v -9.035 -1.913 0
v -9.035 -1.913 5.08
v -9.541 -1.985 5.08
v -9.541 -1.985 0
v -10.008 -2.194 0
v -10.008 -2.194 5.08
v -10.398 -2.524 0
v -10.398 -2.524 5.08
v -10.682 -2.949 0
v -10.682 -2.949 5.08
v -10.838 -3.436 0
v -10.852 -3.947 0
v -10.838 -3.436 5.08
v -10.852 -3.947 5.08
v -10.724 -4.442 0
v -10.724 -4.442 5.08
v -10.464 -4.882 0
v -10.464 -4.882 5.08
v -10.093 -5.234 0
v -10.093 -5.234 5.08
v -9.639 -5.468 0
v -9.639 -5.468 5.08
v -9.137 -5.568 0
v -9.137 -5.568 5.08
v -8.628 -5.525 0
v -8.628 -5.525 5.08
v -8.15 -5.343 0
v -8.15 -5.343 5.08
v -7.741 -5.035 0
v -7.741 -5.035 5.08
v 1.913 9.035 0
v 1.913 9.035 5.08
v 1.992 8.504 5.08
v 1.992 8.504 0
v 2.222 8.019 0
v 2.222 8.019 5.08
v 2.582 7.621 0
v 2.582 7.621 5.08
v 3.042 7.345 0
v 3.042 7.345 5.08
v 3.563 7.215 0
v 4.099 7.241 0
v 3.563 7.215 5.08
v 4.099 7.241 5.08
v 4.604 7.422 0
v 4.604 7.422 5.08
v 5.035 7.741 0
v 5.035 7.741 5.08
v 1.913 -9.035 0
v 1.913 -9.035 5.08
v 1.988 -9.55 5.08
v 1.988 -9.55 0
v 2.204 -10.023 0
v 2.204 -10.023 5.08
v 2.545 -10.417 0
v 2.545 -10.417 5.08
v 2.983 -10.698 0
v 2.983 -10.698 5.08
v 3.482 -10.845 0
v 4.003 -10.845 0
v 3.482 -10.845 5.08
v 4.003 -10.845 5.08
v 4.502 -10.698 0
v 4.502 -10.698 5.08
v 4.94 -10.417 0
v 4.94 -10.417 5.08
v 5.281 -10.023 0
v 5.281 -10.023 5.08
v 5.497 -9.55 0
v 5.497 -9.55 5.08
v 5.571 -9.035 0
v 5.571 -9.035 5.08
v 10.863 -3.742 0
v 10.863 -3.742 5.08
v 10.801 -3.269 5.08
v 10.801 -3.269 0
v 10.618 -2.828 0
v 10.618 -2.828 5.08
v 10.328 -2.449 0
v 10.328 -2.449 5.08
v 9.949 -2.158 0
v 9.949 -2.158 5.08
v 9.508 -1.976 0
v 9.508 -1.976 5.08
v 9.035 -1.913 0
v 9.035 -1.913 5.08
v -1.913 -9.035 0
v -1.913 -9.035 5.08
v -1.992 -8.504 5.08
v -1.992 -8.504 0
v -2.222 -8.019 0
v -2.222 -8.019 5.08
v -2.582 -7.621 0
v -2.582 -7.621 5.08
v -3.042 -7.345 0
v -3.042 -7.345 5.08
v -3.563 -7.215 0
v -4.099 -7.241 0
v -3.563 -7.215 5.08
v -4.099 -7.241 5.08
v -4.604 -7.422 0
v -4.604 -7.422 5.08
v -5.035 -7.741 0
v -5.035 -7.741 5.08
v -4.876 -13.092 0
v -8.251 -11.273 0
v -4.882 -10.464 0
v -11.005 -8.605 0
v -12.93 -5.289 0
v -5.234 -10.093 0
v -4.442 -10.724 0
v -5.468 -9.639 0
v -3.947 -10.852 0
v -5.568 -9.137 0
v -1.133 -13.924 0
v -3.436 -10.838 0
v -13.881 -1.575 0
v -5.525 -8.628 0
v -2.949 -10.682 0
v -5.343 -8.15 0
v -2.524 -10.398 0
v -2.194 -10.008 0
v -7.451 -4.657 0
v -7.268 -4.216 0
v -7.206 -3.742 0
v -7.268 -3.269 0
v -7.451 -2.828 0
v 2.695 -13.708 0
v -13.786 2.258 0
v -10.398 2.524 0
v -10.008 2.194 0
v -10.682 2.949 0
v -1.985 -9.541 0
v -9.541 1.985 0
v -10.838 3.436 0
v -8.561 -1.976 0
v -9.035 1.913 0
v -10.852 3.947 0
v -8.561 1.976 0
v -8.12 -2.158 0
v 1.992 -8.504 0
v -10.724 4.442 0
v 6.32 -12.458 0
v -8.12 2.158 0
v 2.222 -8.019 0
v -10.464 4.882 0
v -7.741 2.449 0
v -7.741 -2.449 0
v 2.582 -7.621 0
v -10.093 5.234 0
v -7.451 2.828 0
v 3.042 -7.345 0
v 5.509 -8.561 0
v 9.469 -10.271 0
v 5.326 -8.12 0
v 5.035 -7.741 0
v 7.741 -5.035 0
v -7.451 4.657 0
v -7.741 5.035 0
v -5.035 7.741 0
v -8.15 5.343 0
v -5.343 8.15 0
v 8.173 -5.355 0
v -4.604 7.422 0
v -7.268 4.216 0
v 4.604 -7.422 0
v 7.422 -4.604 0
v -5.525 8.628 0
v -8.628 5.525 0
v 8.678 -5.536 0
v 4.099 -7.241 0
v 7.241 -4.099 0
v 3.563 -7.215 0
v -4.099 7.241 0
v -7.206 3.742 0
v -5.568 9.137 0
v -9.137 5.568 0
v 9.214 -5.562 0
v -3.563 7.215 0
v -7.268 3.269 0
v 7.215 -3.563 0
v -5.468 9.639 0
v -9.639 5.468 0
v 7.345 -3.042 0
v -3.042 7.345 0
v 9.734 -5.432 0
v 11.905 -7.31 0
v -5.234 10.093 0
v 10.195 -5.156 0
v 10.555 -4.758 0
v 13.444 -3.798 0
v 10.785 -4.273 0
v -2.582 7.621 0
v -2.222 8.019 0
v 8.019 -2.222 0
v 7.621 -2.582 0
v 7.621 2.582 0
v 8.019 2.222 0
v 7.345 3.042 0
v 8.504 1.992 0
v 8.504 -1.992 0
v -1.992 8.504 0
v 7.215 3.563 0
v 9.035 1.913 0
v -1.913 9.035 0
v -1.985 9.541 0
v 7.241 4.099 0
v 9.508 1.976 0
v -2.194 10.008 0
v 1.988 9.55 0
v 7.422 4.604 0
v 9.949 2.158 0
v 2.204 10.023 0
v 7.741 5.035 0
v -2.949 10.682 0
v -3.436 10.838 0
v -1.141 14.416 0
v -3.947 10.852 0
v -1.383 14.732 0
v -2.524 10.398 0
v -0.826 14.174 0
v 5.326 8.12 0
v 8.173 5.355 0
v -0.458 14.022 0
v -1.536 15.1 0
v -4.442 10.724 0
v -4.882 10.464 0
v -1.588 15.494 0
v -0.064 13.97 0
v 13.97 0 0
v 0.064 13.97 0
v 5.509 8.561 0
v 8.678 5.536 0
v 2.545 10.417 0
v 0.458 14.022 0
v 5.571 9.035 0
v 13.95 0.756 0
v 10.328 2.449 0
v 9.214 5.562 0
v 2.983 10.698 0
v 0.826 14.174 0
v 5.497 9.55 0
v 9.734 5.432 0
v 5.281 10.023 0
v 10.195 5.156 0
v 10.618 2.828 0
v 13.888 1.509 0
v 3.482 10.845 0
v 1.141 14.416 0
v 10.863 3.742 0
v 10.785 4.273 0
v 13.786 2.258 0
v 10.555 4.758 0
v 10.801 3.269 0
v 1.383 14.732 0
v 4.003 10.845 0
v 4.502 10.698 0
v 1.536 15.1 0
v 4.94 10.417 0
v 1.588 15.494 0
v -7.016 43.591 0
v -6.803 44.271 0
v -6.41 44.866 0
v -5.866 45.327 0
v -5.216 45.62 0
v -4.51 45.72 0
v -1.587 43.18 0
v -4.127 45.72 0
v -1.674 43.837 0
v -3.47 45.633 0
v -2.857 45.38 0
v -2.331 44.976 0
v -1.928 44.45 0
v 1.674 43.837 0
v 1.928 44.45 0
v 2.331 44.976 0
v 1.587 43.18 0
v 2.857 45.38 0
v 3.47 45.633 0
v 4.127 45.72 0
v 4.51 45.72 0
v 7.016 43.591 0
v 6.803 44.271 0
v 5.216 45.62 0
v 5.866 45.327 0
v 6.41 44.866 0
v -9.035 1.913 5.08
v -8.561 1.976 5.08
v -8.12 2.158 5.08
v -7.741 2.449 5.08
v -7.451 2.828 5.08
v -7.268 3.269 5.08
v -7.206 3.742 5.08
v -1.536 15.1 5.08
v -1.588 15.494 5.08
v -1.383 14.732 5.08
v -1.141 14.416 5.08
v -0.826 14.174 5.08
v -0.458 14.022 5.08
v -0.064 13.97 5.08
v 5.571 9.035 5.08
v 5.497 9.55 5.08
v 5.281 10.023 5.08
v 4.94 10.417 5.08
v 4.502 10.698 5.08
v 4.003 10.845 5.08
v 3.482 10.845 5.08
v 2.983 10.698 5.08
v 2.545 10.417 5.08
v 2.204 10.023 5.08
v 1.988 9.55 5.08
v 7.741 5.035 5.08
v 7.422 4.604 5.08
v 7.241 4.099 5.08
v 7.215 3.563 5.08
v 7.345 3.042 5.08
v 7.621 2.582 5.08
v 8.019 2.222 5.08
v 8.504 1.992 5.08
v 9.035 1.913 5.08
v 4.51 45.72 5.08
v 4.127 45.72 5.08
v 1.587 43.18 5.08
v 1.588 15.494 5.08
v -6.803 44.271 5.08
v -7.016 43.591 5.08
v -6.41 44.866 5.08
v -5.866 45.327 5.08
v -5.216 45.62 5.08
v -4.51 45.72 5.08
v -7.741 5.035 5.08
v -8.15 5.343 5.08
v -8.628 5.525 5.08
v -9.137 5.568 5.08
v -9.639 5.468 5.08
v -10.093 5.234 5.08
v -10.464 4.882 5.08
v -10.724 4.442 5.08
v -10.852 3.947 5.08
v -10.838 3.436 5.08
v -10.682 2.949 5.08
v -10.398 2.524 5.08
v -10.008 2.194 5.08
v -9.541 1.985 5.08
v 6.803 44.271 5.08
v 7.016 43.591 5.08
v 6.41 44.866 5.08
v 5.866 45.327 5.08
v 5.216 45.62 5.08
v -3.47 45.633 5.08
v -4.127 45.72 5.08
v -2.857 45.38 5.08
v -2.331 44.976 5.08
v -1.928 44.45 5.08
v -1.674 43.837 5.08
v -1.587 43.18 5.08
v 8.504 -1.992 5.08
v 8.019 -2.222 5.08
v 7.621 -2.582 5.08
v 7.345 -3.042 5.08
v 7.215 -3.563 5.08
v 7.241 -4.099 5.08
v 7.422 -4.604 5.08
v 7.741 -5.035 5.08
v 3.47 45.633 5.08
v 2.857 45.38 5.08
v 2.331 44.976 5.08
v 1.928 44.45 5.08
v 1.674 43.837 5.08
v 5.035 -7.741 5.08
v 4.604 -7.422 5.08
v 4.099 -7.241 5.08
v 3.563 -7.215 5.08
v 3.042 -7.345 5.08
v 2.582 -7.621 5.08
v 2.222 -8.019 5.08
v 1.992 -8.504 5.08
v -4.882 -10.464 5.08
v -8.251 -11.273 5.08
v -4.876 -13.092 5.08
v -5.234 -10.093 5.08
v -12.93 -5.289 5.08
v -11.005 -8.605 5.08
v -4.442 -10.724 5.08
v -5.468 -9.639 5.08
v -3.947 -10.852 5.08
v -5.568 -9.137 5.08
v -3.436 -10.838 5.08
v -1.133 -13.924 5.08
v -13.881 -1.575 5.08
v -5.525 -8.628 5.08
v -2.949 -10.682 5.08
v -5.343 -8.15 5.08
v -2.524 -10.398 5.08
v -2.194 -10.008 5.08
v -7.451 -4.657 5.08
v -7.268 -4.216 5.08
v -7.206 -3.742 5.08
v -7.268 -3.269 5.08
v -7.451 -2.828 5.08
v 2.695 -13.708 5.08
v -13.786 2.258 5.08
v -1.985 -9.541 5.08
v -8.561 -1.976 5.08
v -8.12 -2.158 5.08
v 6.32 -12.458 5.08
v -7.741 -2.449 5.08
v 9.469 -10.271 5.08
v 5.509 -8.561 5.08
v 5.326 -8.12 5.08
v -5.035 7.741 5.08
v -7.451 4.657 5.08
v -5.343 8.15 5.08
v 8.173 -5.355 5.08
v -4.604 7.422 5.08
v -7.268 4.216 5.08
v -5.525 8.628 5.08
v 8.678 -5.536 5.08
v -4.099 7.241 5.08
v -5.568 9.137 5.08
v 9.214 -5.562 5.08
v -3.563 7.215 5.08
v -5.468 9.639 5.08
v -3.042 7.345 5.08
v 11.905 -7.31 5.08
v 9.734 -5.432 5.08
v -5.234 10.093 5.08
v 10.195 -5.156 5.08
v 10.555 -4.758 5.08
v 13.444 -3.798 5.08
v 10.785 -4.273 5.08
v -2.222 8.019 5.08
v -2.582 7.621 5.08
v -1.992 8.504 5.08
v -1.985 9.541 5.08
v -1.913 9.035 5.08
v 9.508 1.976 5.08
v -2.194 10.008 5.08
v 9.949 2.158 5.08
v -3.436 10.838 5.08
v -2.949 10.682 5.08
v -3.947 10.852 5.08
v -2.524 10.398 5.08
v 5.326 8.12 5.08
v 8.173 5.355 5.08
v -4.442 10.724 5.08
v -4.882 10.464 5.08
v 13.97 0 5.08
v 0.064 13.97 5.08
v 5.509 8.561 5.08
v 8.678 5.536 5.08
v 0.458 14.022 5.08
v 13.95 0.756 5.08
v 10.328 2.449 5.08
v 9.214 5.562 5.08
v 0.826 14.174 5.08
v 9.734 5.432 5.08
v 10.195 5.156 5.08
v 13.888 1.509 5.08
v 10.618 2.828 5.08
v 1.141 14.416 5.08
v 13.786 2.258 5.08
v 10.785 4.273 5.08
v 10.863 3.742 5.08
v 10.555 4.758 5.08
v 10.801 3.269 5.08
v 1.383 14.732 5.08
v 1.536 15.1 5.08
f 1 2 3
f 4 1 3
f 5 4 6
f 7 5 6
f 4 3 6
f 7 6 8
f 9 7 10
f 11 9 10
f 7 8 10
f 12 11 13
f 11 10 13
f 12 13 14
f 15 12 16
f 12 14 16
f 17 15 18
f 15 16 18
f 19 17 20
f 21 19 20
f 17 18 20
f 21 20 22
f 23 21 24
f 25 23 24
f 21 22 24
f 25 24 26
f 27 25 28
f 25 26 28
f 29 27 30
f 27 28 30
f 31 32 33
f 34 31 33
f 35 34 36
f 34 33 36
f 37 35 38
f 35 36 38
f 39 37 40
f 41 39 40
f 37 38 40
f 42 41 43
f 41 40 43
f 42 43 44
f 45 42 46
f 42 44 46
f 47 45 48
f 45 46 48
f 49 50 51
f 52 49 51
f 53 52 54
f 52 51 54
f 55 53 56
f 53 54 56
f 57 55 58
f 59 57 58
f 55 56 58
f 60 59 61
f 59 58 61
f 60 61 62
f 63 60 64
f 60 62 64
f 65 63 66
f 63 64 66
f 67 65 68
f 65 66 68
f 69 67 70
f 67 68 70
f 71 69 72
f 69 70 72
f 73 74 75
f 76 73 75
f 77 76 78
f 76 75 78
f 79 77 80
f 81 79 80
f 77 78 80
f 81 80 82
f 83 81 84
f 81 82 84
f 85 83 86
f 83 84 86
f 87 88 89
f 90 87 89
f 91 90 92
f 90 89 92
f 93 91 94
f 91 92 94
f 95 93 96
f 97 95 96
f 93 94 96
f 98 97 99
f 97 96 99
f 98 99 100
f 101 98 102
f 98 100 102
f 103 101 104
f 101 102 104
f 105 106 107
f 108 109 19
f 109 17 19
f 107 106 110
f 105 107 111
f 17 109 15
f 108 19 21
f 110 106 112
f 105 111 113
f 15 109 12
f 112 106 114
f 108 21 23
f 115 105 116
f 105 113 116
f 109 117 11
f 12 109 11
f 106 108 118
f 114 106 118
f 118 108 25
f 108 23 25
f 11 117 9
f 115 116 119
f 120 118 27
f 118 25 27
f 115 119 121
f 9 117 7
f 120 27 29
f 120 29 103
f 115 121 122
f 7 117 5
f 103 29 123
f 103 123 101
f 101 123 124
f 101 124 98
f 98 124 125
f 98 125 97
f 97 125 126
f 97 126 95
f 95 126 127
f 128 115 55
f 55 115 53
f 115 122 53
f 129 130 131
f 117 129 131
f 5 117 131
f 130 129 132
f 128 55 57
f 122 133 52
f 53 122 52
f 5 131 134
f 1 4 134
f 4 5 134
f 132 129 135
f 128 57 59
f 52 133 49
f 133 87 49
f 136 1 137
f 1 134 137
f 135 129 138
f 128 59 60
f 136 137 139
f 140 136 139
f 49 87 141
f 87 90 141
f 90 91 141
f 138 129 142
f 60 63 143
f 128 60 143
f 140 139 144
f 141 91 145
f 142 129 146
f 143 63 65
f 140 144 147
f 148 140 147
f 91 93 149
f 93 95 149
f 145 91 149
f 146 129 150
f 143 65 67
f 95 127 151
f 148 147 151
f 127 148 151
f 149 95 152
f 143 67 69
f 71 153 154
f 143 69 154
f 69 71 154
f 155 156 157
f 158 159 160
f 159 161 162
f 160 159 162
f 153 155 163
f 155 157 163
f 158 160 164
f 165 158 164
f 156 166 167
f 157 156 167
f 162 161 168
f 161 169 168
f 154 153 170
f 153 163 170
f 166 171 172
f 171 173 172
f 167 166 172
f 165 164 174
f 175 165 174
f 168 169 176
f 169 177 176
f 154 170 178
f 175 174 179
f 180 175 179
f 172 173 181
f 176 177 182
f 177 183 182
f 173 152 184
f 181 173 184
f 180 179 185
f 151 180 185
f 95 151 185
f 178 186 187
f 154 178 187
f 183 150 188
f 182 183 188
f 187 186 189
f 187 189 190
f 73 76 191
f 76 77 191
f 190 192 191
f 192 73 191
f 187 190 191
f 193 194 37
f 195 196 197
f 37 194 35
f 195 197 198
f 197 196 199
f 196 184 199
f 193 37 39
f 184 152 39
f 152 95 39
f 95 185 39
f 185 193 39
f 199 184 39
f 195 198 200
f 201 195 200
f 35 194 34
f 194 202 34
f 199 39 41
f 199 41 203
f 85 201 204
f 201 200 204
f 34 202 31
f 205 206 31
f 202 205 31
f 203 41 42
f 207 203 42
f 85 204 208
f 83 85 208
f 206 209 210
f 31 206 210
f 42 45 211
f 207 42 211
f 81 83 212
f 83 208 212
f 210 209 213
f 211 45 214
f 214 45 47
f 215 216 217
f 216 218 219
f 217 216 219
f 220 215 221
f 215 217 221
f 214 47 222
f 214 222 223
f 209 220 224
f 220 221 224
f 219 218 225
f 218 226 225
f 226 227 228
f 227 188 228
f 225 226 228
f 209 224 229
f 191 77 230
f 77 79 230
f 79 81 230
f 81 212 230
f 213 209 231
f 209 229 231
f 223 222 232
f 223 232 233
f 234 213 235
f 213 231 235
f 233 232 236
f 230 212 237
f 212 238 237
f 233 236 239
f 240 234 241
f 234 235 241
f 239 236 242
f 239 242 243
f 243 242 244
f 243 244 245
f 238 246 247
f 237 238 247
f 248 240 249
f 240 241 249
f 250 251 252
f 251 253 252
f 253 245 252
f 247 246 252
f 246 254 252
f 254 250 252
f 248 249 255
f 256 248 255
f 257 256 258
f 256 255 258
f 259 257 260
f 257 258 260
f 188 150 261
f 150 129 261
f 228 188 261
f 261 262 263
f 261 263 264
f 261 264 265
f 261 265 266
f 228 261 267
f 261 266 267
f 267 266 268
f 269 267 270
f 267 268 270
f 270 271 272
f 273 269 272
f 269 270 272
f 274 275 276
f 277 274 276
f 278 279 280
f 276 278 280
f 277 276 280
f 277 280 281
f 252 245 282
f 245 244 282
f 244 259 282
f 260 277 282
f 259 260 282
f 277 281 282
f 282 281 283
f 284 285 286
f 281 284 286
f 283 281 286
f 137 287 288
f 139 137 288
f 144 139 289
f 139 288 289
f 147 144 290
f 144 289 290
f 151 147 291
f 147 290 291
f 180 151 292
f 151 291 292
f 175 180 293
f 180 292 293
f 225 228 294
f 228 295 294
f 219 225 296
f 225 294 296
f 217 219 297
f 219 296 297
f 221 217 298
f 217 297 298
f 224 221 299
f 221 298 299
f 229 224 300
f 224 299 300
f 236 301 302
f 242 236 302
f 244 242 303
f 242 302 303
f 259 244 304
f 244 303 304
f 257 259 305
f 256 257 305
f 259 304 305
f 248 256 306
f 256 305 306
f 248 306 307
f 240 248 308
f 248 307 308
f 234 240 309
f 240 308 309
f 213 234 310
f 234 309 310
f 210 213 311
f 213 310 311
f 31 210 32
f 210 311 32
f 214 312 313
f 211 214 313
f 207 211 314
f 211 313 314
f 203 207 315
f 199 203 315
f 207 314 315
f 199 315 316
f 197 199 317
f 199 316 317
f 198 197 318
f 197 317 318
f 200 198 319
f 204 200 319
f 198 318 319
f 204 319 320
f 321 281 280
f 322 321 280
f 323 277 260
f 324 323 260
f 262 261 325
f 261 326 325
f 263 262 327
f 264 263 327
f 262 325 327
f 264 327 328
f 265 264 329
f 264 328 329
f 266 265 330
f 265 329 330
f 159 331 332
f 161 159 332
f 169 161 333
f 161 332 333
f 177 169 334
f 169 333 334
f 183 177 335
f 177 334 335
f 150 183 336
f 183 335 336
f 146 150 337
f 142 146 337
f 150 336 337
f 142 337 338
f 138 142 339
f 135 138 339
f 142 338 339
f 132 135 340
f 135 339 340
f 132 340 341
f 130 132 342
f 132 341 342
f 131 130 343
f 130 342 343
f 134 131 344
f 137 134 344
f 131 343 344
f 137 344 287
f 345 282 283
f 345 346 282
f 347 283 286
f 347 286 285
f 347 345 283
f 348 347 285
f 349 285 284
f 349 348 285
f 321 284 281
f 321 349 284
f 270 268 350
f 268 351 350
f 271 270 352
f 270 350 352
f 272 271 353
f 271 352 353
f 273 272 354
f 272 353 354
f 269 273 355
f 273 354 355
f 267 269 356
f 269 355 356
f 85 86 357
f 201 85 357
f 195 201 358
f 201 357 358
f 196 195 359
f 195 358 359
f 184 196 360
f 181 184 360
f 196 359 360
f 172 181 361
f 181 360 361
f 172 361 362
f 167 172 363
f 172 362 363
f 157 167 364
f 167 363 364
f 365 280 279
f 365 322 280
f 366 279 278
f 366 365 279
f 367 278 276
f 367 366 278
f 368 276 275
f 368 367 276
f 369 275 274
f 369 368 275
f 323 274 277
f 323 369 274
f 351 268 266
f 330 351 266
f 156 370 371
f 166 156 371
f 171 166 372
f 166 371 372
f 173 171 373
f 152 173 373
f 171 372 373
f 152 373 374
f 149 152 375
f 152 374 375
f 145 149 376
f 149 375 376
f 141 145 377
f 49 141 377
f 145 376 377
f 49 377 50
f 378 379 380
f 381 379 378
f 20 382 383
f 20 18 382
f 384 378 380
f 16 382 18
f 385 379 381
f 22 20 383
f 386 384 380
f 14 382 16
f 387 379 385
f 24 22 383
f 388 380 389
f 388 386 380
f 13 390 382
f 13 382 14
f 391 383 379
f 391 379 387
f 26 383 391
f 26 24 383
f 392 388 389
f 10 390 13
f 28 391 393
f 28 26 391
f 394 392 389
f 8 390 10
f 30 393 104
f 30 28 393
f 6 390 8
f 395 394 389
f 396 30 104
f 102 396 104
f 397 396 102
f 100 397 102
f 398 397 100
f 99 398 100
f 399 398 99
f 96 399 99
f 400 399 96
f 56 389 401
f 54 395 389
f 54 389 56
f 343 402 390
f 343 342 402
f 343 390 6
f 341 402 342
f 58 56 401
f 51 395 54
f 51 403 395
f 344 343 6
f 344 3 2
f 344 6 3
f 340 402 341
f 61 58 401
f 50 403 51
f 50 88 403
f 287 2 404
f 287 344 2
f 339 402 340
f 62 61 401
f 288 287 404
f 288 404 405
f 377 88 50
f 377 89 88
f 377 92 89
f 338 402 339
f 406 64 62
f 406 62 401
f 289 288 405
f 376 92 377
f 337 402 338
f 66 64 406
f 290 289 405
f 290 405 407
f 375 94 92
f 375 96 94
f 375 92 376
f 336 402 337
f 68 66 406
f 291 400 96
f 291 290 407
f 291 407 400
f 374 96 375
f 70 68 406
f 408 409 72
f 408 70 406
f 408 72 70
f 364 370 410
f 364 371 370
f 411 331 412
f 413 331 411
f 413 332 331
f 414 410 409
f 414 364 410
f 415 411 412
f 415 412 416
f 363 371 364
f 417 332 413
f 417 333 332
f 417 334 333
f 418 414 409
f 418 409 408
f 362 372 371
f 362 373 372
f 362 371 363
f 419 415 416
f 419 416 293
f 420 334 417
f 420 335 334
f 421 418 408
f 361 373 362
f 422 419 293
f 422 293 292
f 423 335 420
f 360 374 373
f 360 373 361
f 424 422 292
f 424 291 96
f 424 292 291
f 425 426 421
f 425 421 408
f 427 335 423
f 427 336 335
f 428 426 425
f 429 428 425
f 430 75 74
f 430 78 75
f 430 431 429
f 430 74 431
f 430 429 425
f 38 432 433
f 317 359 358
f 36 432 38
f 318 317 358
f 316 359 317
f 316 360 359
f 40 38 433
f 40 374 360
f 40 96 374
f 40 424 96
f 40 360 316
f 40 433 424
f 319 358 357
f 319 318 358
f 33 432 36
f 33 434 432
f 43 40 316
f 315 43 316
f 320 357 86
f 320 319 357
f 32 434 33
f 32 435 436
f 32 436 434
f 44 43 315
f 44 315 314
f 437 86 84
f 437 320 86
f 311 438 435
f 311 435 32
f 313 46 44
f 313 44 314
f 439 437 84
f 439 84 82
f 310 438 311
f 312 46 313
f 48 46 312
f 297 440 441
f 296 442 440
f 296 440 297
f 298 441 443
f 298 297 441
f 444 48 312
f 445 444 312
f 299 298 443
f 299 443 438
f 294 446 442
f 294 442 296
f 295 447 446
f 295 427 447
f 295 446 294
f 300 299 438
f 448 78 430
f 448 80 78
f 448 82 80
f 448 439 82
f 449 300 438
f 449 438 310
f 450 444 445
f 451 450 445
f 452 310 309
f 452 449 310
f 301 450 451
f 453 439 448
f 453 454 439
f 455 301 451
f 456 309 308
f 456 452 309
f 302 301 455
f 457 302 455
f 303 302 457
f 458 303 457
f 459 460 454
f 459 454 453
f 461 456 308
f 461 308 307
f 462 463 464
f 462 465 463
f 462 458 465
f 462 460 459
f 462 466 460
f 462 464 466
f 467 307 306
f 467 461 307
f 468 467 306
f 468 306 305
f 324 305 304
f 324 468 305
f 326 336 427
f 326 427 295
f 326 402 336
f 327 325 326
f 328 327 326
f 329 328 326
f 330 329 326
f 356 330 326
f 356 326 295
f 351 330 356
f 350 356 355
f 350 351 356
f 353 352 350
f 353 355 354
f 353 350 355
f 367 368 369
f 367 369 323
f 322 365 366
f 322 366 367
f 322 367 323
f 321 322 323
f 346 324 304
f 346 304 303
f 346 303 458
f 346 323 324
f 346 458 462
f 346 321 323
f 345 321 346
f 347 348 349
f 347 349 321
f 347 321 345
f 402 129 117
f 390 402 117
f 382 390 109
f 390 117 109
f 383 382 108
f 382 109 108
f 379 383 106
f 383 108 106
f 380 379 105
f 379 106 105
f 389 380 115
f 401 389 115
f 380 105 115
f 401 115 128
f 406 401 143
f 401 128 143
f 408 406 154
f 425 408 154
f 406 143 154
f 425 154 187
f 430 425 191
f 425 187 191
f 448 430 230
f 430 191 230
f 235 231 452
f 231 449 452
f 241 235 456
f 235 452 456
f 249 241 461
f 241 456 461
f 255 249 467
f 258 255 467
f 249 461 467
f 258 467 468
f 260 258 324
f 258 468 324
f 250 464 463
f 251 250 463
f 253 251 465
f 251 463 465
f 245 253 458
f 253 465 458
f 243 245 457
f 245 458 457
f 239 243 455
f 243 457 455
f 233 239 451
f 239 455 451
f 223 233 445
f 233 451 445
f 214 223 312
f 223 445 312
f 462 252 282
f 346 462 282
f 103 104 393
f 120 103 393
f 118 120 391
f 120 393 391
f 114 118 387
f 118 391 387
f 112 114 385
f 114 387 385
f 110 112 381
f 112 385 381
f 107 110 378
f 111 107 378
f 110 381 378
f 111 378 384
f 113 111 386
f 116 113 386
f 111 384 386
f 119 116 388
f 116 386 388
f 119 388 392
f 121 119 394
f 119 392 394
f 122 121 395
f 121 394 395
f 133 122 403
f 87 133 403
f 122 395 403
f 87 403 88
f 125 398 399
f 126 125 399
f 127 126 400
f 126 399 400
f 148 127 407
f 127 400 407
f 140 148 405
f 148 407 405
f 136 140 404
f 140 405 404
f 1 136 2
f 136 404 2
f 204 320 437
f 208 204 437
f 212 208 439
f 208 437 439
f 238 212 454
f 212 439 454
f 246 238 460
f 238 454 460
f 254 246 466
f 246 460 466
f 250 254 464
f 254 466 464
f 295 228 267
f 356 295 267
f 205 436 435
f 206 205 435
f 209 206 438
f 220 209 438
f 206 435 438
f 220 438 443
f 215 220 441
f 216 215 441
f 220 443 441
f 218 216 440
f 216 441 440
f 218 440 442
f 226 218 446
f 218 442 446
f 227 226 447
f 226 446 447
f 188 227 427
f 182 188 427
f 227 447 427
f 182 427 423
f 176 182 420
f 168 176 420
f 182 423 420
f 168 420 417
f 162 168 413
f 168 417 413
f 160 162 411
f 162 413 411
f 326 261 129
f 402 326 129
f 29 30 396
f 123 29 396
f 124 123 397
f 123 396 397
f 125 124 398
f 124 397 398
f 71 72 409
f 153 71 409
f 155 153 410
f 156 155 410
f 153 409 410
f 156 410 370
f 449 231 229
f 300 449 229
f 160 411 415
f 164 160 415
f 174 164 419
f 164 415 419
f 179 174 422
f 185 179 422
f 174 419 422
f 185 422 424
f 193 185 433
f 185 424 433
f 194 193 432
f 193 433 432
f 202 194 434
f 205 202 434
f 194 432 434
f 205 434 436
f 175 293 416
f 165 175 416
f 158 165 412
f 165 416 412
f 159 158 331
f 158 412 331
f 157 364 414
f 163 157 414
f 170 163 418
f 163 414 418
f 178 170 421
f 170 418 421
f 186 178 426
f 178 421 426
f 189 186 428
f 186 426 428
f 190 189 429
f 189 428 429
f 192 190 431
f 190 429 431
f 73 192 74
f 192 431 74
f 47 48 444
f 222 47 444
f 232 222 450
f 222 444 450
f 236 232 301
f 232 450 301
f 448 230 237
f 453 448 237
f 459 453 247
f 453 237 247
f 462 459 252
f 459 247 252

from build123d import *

# Parameters (mm, degrees)
F1_DEPTH = 5.08
F3_DEPTH = 25.4
F4_R     = 2.54
F5_R     = 1.524


with BuildPart() as f1:
    # F0 (on Top) → F1 (new body)
    with BuildSketch(Plane.XY):
        with BuildLine():
            ThreePointArc((-13.7862916745, 2.2581102419), (-1.1327853518, -13.9239971756), (13.97, 0))
            ThreePointArc((13.97, 0), (13.9239971756, 1.1327853518), (13.7862916745, 2.2581102419))
            ThreePointArc((13.7862916745, 2.2581102419), (9.0447526202, 10.646753028), (0, 13.97))
            ThreePointArc((0, 13.97), (-9.0447526202, 10.646753028), (-13.7862916745, 2.2581102419))
        make_face()
        with BuildLine():
            Line((-6.6675, 45.72), (-13.7862916745, 2.2581102419))
            ThreePointArc((-13.7862916745, 2.2581102419), (-9.0447526202, 10.646753028), (0, 13.97))
            Line((0, 13.97), (-1.5875, 13.97))
            Line((-1.5875, 13.97), (-1.5875, 45.72))
            Line((-1.5875, 45.72), (-6.6675, 45.72))
        make_face()
        with BuildLine():
            ThreePointArc((0, 13.97), (9.0447526202, 10.646753028), (13.7862916745, 2.2581102419))
            Line((13.7862916745, 2.2581102419), (6.6675, 45.72))
            Line((6.6675, 45.72), (1.5875, 45.72))
            Line((1.5875, 45.72), (1.5875, 13.97))
            Line((1.5875, 13.97), (0, 13.97))
        make_face()
    extrude(amount=F1_DEPTH)

    # F2 (on face) → F3 (cut)
    with BuildSketch(Plane.XY.offset(5.08)):
        with BuildLine():
            Line((-3.7422612851, 9.0346179484), (-1.9134612851, 9.0346179484))
            ThreePointArc((-1.9134612851, 9.0346179484), (-4.4421127462, 10.7242088375), (-5.0354181665, 7.741461067))
            Line((-5.0354181665, 7.741461067), (-3.7422612851, 9.0346179484))
        make_face()
        with BuildLine():
            ThreePointArc((-5.0354181665, 7.741461067), (-3.042409824, 7.3450270594), (-1.9134612851, 9.0346179484))
            Line((-1.9134612851, 9.0346179484), (-3.7422612851, 9.0346179484))
            Line((-3.7422612851, 9.0346179484), (-5.0354181665, 7.741461067))
        make_face()
        with BuildLine():
            Line((3.7422612851, 9.0346179484), (5.0354181665, 7.741461067))
            ThreePointArc((5.0354181665, 7.741461067), (5.4318521742, 8.3347664873), (5.5710612851, 9.0346179484))
            ThreePointArc((5.5710612851, 9.0346179484), (3.7422612851, 10.8634179484), (1.9134612851, 9.0346179484))
            Line((1.9134612851, 9.0346179484), (3.7422612851, 9.0346179484))
        make_face()
        with BuildLine():
            ThreePointArc((1.9134612851, 9.0346179484), (3.042409824, 7.3450270594), (5.0354181665, 7.741461067))
            Line((5.0354181665, 7.741461067), (3.7422612851, 9.0346179484))
            Line((3.7422612851, 9.0346179484), (1.9134612851, 9.0346179484))
        make_face()
        with BuildLine():
            Line((7.741461067, 5.0354181665), (9.0346179484, 3.7422612851))
            Line((9.0346179484, 3.7422612851), (9.0346179484, 1.9134612851))
            ThreePointArc((9.0346179484, 1.9134612851), (10.3277748299, 2.4491044037), (10.8634179484, 3.7422612851))
            ThreePointArc((10.8634179484, 3.7422612851), (9.7344694095, 5.4318521742), (7.741461067, 5.0354181665))
        make_face()
        with BuildLine():
            Line((9.0346179484, 1.9134612851), (9.0346179484, 3.7422612851))
            Line((9.0346179484, 3.7422612851), (7.741461067, 5.0354181665))
            ThreePointArc((7.741461067, 5.0354181665), (7.3450270594, 3.042409824), (9.0346179484, 1.9134612851))
        make_face()
        with BuildLine():
            ThreePointArc((10.8634179484, -3.7422612851), (10.3277748299, -2.4491044037), (9.0346179484, -1.9134612851))
            Line((9.0346179484, -1.9134612851), (9.0346179484, -3.7422612851))
            Line((9.0346179484, -3.7422612851), (7.741461067, -5.0354181665))
            ThreePointArc((7.741461067, -5.0354181665), (9.7344694095, -5.4318521742), (10.8634179484, -3.7422612851))
        make_face()
        with BuildLine():
            Line((9.0346179484, -3.7422612851), (9.0346179484, -1.9134612851))
            ThreePointArc((9.0346179484, -1.9134612851), (7.3450270594, -3.042409824), (7.741461067, -5.0354181665))
            Line((7.741461067, -5.0354181665), (9.0346179484, -3.7422612851))
        make_face()
        with BuildLine():
            ThreePointArc((5.5710612851, -9.0346179484), (5.4318521742, -8.3347664873), (5.0354181665, -7.741461067))
            Line((5.0354181665, -7.741461067), (3.7422612851, -9.0346179484))
            Line((3.7422612851, -9.0346179484), (1.9134612851, -9.0346179484))
            ThreePointArc((1.9134612851, -9.0346179484), (3.7422612851, -10.8634179484), (5.5710612851, -9.0346179484))
        make_face()
        with BuildLine():
            Line((3.7422612851, -9.0346179484), (5.0354181665, -7.741461067))
            ThreePointArc((5.0354181665, -7.741461067), (3.042409824, -7.3450270594), (1.9134612851, -9.0346179484))
            Line((1.9134612851, -9.0346179484), (3.7422612851, -9.0346179484))
        make_face()
        with BuildLine():
            ThreePointArc((-5.0354181665, -7.741461067), (-4.4421127462, -10.7242088375), (-1.9134612851, -9.0346179484))
            Line((-1.9134612851, -9.0346179484), (-3.7422612851, -9.0346179484))
            Line((-3.7422612851, -9.0346179484), (-5.0354181665, -7.741461067))
        make_face()
        with BuildLine():
            Line((-3.7422612851, -9.0346179484), (-1.9134612851, -9.0346179484))
            ThreePointArc((-1.9134612851, -9.0346179484), (-3.042409824, -7.3450270594), (-5.0354181665, -7.741461067))
            Line((-5.0354181665, -7.741461067), (-3.7422612851, -9.0346179484))
        make_face()
        with BuildLine():
            Line((-9.0346179484, -3.7422612851), (-7.741461067, -5.0354181665))
            ThreePointArc((-7.741461067, -5.0354181665), (-7.3450270594, -4.4421127462), (-7.2058179484, -3.7422612851))
            ThreePointArc((-7.2058179484, -3.7422612851), (-7.741461067, -2.4491044037), (-9.0346179484, -1.9134612851))
            Line((-9.0346179484, -1.9134612851), (-9.0346179484, -3.7422612851))
        make_face()
        with BuildLine():
            ThreePointArc((-9.0346179484, -1.9134612851), (-10.7242088375, -4.4421127462), (-7.741461067, -5.0354181665))
            Line((-7.741461067, -5.0354181665), (-9.0346179484, -3.7422612851))
            Line((-9.0346179484, -3.7422612851), (-9.0346179484, -1.9134612851))
        make_face()
        with BuildLine():
            Line((-9.0346179484, 3.7422612851), (-7.741461067, 5.0354181665))
            ThreePointArc((-7.741461067, 5.0354181665), (-10.7242088375, 4.4421127462), (-9.0346179484, 1.9134612851))
            Line((-9.0346179484, 1.9134612851), (-9.0346179484, 3.7422612851))
        make_face()
        with BuildLine():
            ThreePointArc((-7.2058179484, 3.7422612851), (-7.3450270594, 4.4421127462), (-7.741461067, 5.0354181665))
            Line((-7.741461067, 5.0354181665), (-9.0346179484, 3.7422612851))
            Line((-9.0346179484, 3.7422612851), (-9.0346179484, 1.9134612851))
            ThreePointArc((-9.0346179484, 1.9134612851), (-7.741461067, 2.4491044037), (-7.2058179484, 3.7422612851))
        make_face()
    extrude(amount=-F3_DEPTH, mode=Mode.SUBTRACT)

    # F4
    f4_edges = [f1.edges().sort_by_distance(p)[0] for p in [
        (1.5875, 45.72, 2.54),
        (-1.5875, 45.72, 2.54),
        (-6.6675, 45.72, 2.54),
        (6.6675, 45.72, 2.54),
    ]]
    fillet(f4_edges, radius=F4_R)

    # F5
    f5_edges = [f1.edges().sort_by_distance(p)[0] for p in [
        (-1.5875, 13.97, 2.54),
        (1.5875, 13.97, 2.54),
    ]]
    fillet(f5_edges, radius=F5_R)


solid = f1.part
